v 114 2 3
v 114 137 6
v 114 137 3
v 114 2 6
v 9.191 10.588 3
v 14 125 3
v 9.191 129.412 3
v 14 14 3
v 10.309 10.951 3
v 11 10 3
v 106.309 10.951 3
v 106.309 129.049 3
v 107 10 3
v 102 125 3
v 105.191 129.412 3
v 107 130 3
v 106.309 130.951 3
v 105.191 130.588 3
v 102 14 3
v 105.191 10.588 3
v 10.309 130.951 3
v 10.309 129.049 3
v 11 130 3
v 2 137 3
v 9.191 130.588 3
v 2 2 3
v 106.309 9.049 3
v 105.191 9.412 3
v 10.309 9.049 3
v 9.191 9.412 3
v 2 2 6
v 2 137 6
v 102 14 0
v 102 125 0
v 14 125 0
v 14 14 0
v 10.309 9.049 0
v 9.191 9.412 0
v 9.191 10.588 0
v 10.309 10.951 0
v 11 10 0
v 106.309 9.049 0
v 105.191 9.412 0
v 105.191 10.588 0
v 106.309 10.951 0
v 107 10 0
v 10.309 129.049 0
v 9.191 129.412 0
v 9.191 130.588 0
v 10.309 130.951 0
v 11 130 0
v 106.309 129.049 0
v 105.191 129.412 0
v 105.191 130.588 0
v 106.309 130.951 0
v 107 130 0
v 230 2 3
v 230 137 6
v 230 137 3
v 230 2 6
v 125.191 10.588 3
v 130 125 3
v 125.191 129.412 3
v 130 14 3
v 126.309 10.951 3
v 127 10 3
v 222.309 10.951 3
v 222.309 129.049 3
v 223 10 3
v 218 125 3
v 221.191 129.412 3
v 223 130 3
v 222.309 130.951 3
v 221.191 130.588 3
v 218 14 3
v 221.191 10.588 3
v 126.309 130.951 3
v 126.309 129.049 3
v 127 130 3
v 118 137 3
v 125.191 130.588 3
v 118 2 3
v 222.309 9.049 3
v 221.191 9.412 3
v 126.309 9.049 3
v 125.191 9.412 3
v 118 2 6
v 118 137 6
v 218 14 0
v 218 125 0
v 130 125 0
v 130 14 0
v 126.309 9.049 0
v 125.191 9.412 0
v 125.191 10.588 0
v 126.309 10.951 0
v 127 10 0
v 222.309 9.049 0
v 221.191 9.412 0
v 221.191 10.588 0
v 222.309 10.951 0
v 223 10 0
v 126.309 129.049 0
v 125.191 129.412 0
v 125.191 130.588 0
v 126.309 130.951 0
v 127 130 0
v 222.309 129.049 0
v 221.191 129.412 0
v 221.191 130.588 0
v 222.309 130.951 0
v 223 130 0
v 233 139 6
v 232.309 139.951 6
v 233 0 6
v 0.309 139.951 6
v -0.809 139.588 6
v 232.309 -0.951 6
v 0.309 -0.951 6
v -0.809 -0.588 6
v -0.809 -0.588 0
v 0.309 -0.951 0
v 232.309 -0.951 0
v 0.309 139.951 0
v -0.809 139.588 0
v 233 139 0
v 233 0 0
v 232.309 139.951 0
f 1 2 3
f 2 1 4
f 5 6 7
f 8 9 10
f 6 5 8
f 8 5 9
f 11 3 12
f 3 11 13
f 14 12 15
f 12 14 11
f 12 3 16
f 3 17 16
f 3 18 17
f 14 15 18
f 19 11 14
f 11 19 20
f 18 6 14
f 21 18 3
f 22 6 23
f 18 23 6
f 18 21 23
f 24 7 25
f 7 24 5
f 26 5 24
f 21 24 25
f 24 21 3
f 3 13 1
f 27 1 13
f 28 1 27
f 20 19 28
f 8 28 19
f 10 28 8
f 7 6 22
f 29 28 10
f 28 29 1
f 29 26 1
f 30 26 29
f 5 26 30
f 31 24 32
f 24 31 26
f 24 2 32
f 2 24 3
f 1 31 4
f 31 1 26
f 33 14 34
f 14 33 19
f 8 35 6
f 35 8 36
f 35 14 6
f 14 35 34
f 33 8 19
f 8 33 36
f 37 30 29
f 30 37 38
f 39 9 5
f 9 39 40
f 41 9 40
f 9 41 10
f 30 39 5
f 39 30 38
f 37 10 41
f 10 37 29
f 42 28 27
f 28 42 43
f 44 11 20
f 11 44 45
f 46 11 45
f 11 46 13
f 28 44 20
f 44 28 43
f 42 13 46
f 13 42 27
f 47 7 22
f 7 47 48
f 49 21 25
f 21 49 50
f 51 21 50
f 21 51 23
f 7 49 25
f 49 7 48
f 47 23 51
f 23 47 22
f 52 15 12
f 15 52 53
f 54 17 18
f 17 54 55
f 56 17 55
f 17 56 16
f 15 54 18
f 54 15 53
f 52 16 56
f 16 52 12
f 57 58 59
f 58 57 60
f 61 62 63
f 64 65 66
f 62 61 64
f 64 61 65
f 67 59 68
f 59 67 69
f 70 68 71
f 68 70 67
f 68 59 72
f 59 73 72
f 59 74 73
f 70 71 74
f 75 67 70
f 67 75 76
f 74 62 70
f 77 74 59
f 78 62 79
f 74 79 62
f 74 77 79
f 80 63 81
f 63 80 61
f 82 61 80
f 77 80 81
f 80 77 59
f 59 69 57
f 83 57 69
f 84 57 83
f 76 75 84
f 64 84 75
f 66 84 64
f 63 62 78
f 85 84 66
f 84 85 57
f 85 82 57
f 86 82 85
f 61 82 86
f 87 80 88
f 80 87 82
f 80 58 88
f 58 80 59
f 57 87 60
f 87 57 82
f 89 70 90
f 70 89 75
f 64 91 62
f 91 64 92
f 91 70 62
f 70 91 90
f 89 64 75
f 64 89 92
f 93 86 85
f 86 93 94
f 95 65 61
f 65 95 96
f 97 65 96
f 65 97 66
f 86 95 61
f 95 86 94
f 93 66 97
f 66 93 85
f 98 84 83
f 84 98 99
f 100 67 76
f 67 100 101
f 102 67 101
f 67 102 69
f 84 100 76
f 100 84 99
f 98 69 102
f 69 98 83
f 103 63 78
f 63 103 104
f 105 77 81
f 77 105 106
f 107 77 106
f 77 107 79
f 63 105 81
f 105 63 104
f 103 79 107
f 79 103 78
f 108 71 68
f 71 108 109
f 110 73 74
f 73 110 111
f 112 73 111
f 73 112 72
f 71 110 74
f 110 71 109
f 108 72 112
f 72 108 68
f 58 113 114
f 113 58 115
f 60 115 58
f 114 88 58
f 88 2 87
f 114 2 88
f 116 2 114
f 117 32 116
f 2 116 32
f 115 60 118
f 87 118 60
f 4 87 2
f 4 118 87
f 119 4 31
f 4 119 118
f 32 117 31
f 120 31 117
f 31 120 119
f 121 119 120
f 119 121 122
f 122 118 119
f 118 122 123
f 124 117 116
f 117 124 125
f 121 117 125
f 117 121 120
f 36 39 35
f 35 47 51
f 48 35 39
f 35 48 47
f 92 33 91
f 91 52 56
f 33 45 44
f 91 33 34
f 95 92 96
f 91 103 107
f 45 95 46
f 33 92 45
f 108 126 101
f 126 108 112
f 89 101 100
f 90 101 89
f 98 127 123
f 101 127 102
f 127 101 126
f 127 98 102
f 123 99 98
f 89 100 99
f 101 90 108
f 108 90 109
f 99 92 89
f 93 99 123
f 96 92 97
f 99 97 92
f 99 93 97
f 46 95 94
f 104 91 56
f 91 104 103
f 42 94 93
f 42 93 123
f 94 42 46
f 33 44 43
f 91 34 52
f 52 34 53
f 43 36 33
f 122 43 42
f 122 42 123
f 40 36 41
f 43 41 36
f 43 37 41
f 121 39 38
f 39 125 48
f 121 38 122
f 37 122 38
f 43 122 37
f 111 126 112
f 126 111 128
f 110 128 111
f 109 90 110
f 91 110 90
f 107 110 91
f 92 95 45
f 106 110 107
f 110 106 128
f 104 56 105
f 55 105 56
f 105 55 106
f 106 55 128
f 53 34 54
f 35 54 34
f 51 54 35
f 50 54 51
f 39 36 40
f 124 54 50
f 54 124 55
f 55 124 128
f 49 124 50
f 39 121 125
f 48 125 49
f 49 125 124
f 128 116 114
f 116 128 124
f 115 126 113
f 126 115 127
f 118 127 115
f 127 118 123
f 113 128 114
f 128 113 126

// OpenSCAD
module panel_socle()
{

module extrude(coord)
{
	translate(coord){
			translate([0,0,-1]){
				union(){
					translate([0,0,4]){
						cube([112,135,20],false);
					};
					translate([12,12,0]){
						cube([88,111,20],false);
					};
					translate([8,8,0]){
						cylinder(20,1);
					};
					translate([104,8,0]){
						cylinder(20,1);
					};
					translate([8,128,0]){
						cylinder(20,1);
					};
					translate([104,128,0]){
						cylinder(20,1);
					};
				};
			}
		};
	}

	rayon = 2;
	difference(){
		minkowski()
		{
			cube(size=[232,139,4], center=false);
			cylinder(rayon,h=2);
		}
		extrude([2,2,0]);
		extrude([2+112+4, 2, 0]);
	}

};

panel_socle();
